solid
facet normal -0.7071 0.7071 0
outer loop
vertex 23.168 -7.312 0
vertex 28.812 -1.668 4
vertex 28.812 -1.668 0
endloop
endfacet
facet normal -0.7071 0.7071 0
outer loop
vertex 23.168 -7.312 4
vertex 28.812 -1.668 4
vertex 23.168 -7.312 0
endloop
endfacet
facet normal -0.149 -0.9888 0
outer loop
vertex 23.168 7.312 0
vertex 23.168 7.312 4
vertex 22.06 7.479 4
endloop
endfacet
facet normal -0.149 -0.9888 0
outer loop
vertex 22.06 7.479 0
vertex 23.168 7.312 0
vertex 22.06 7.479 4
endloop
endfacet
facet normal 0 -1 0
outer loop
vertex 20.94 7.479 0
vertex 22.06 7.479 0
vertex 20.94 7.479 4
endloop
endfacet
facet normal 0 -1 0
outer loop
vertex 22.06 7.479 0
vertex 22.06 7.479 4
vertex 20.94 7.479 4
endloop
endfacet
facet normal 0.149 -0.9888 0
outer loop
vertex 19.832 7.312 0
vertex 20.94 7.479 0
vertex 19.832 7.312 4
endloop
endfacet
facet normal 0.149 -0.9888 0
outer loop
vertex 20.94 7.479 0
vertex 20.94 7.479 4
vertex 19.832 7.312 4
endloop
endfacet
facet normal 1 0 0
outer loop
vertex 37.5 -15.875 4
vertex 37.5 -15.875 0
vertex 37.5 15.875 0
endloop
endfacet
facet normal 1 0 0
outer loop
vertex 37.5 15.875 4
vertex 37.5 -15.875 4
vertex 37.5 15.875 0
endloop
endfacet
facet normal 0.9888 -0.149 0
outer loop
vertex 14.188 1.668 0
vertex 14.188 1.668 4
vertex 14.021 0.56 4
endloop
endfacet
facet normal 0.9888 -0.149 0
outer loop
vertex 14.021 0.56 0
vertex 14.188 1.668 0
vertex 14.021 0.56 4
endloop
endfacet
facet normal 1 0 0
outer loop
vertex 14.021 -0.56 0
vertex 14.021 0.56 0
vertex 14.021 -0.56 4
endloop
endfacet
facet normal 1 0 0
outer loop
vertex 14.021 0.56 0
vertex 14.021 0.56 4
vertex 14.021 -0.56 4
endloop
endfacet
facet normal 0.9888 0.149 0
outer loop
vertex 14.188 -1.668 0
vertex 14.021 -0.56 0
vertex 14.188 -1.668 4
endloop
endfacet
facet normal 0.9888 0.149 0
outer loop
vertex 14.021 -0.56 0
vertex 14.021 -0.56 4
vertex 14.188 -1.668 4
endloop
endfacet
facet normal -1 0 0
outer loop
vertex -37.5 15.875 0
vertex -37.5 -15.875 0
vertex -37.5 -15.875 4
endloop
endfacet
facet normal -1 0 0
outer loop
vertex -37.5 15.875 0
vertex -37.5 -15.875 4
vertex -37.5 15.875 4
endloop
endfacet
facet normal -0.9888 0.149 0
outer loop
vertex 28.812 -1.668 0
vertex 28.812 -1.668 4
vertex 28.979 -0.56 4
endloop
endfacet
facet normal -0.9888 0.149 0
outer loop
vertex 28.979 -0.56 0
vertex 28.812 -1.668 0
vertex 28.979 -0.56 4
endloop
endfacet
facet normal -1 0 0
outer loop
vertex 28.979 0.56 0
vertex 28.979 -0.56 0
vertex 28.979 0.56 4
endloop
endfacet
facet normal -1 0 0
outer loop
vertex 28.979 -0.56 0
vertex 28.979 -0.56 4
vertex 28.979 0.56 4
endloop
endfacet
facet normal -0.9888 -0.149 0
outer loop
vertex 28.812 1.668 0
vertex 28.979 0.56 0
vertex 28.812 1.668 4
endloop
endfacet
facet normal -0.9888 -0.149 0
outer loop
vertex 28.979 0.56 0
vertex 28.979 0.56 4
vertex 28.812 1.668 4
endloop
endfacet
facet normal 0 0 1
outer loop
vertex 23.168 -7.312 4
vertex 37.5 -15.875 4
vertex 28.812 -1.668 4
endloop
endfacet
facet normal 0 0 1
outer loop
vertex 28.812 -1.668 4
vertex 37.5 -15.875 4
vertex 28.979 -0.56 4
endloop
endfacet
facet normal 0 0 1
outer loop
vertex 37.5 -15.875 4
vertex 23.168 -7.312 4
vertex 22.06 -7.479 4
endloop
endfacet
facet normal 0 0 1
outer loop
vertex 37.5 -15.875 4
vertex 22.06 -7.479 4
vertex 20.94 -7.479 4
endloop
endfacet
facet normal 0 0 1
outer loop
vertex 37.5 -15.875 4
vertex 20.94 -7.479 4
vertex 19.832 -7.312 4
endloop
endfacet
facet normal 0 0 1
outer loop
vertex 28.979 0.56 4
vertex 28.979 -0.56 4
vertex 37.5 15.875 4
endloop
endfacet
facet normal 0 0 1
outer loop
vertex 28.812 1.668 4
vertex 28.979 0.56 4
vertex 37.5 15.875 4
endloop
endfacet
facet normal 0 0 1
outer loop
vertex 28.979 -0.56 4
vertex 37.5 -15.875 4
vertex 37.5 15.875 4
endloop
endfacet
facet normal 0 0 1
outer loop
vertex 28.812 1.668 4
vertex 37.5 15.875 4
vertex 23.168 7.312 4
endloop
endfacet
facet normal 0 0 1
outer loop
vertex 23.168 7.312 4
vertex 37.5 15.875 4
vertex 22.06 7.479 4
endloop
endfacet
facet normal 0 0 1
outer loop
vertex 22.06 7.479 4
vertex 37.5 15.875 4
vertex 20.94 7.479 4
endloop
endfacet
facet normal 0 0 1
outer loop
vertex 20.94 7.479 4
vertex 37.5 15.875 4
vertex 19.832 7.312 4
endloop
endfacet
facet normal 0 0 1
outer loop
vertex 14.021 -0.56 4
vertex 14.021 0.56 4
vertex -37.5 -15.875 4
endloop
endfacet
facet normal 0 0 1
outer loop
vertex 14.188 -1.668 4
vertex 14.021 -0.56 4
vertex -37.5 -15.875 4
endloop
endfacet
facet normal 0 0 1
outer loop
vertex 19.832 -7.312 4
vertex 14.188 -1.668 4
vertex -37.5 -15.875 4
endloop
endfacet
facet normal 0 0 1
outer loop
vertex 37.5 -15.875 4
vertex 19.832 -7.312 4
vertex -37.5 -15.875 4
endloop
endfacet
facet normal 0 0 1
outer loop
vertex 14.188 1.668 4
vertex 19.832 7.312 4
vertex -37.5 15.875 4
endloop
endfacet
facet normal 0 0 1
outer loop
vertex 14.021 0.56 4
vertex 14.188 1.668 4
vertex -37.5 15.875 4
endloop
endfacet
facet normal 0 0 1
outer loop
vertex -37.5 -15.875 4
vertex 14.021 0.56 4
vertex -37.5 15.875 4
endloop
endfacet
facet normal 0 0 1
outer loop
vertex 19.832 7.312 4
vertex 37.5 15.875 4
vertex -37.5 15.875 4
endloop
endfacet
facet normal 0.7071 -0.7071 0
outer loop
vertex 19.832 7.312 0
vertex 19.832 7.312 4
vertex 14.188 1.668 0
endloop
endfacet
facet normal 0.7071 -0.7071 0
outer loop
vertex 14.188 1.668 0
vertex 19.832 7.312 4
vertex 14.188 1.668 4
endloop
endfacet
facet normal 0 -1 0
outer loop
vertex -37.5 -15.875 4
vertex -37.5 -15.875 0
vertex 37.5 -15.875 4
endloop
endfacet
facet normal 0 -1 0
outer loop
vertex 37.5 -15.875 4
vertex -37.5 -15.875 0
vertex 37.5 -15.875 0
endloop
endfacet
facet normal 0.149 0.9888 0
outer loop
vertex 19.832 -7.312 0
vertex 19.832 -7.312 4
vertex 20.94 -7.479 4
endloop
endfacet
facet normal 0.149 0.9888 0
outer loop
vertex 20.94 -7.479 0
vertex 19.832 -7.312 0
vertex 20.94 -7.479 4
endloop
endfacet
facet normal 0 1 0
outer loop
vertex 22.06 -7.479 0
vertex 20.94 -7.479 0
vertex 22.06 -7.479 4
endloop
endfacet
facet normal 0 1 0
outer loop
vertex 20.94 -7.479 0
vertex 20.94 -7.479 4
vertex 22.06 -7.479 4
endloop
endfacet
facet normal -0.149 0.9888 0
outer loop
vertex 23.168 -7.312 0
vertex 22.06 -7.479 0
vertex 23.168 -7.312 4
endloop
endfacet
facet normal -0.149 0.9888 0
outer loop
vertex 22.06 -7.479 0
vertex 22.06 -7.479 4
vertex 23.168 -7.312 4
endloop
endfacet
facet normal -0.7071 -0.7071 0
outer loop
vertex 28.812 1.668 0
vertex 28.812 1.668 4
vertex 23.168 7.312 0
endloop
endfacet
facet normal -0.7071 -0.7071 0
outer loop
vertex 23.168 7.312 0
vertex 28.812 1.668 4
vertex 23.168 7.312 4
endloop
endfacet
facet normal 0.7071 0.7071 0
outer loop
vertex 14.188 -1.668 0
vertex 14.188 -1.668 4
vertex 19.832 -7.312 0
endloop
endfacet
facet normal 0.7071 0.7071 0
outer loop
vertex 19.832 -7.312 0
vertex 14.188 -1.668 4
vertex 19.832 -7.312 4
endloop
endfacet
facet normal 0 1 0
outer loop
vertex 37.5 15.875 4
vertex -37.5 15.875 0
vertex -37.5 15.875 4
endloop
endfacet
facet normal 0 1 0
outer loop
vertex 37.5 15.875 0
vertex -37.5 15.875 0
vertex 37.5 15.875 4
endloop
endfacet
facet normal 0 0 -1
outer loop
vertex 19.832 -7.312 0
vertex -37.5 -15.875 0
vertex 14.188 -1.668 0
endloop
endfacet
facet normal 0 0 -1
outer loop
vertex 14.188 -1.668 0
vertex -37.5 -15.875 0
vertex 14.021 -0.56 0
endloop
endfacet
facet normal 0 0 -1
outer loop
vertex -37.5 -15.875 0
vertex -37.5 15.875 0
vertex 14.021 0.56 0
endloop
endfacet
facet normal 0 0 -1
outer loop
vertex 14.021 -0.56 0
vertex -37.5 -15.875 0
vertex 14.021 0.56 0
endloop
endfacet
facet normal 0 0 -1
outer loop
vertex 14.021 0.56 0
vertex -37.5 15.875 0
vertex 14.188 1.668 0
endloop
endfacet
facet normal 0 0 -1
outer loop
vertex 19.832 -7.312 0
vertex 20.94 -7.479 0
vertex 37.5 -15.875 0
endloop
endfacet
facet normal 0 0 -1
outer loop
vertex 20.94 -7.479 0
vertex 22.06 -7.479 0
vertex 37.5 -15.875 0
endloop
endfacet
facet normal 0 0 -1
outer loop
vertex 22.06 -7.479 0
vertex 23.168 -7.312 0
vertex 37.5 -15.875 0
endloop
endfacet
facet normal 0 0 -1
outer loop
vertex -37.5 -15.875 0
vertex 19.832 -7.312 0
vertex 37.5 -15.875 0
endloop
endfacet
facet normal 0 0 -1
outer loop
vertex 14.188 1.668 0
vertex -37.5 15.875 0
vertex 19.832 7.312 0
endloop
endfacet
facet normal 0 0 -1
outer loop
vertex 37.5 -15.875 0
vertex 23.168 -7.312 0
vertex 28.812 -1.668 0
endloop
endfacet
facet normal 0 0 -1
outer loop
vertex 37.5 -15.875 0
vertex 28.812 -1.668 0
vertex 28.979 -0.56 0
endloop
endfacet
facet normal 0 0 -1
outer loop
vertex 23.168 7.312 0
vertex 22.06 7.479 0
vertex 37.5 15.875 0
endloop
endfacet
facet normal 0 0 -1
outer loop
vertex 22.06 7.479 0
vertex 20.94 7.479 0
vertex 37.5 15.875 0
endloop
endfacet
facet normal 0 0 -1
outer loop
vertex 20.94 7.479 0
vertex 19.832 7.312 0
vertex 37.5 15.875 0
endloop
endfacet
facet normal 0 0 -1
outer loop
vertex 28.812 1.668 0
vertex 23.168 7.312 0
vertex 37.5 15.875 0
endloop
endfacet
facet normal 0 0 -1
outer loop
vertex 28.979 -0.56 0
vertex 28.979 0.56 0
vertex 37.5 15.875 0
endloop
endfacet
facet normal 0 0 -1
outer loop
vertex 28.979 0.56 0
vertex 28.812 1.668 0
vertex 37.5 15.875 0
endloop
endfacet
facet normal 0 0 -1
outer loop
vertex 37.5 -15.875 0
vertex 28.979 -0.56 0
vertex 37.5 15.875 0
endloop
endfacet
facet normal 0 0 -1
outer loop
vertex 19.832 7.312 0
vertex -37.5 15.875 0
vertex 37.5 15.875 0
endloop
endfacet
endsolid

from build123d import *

# Parameters (mm, degrees)
SKETCH_W     = 75
SKETCH_H     = 31.75
PAD_DEPTH    = 4
SKETCH001_R  = 7.5
POCKET_DEPTH = 4.001
PAD001_DEPTH = 4


with BuildPart() as part:
    # Sketch → Pad (new body)
    with BuildSketch(Plane.XY):
        Rectangle(SKETCH_W, SKETCH_H)
    extrude(amount=PAD_DEPTH)

    # Sketch001 → Pocket (cut, through all)
    with BuildSketch(Plane.XY.offset(4)):
        with Locations((21.5, 0)):
            Circle(SKETCH001_R)
    extrude(amount=-POCKET_DEPTH, mode=Mode.SUBTRACT)

    # Sketch002 → Pad001 (new body)
    with BuildSketch(Plane.XY.offset(4)):
        Polygon((24.486536, 11.966792), (10.3444, -2.175344), (10.3444, 11.966792), align=None)
        Polygon((29.815649, 0.664607), (21.707865, 8.772391), (34.469826, 11.738337), align=None)
        Polygon((30.957856, 0.4776), (22.4028, -8.077456), (35.779438, -11.627933), align=None)
        Polygon((13.253763, -0.734019), (21.279048, -8.759304), (7.24554, -12.506914), align=None)
    extrude(amount=-PAD001_DEPTH)


solid = part.part
